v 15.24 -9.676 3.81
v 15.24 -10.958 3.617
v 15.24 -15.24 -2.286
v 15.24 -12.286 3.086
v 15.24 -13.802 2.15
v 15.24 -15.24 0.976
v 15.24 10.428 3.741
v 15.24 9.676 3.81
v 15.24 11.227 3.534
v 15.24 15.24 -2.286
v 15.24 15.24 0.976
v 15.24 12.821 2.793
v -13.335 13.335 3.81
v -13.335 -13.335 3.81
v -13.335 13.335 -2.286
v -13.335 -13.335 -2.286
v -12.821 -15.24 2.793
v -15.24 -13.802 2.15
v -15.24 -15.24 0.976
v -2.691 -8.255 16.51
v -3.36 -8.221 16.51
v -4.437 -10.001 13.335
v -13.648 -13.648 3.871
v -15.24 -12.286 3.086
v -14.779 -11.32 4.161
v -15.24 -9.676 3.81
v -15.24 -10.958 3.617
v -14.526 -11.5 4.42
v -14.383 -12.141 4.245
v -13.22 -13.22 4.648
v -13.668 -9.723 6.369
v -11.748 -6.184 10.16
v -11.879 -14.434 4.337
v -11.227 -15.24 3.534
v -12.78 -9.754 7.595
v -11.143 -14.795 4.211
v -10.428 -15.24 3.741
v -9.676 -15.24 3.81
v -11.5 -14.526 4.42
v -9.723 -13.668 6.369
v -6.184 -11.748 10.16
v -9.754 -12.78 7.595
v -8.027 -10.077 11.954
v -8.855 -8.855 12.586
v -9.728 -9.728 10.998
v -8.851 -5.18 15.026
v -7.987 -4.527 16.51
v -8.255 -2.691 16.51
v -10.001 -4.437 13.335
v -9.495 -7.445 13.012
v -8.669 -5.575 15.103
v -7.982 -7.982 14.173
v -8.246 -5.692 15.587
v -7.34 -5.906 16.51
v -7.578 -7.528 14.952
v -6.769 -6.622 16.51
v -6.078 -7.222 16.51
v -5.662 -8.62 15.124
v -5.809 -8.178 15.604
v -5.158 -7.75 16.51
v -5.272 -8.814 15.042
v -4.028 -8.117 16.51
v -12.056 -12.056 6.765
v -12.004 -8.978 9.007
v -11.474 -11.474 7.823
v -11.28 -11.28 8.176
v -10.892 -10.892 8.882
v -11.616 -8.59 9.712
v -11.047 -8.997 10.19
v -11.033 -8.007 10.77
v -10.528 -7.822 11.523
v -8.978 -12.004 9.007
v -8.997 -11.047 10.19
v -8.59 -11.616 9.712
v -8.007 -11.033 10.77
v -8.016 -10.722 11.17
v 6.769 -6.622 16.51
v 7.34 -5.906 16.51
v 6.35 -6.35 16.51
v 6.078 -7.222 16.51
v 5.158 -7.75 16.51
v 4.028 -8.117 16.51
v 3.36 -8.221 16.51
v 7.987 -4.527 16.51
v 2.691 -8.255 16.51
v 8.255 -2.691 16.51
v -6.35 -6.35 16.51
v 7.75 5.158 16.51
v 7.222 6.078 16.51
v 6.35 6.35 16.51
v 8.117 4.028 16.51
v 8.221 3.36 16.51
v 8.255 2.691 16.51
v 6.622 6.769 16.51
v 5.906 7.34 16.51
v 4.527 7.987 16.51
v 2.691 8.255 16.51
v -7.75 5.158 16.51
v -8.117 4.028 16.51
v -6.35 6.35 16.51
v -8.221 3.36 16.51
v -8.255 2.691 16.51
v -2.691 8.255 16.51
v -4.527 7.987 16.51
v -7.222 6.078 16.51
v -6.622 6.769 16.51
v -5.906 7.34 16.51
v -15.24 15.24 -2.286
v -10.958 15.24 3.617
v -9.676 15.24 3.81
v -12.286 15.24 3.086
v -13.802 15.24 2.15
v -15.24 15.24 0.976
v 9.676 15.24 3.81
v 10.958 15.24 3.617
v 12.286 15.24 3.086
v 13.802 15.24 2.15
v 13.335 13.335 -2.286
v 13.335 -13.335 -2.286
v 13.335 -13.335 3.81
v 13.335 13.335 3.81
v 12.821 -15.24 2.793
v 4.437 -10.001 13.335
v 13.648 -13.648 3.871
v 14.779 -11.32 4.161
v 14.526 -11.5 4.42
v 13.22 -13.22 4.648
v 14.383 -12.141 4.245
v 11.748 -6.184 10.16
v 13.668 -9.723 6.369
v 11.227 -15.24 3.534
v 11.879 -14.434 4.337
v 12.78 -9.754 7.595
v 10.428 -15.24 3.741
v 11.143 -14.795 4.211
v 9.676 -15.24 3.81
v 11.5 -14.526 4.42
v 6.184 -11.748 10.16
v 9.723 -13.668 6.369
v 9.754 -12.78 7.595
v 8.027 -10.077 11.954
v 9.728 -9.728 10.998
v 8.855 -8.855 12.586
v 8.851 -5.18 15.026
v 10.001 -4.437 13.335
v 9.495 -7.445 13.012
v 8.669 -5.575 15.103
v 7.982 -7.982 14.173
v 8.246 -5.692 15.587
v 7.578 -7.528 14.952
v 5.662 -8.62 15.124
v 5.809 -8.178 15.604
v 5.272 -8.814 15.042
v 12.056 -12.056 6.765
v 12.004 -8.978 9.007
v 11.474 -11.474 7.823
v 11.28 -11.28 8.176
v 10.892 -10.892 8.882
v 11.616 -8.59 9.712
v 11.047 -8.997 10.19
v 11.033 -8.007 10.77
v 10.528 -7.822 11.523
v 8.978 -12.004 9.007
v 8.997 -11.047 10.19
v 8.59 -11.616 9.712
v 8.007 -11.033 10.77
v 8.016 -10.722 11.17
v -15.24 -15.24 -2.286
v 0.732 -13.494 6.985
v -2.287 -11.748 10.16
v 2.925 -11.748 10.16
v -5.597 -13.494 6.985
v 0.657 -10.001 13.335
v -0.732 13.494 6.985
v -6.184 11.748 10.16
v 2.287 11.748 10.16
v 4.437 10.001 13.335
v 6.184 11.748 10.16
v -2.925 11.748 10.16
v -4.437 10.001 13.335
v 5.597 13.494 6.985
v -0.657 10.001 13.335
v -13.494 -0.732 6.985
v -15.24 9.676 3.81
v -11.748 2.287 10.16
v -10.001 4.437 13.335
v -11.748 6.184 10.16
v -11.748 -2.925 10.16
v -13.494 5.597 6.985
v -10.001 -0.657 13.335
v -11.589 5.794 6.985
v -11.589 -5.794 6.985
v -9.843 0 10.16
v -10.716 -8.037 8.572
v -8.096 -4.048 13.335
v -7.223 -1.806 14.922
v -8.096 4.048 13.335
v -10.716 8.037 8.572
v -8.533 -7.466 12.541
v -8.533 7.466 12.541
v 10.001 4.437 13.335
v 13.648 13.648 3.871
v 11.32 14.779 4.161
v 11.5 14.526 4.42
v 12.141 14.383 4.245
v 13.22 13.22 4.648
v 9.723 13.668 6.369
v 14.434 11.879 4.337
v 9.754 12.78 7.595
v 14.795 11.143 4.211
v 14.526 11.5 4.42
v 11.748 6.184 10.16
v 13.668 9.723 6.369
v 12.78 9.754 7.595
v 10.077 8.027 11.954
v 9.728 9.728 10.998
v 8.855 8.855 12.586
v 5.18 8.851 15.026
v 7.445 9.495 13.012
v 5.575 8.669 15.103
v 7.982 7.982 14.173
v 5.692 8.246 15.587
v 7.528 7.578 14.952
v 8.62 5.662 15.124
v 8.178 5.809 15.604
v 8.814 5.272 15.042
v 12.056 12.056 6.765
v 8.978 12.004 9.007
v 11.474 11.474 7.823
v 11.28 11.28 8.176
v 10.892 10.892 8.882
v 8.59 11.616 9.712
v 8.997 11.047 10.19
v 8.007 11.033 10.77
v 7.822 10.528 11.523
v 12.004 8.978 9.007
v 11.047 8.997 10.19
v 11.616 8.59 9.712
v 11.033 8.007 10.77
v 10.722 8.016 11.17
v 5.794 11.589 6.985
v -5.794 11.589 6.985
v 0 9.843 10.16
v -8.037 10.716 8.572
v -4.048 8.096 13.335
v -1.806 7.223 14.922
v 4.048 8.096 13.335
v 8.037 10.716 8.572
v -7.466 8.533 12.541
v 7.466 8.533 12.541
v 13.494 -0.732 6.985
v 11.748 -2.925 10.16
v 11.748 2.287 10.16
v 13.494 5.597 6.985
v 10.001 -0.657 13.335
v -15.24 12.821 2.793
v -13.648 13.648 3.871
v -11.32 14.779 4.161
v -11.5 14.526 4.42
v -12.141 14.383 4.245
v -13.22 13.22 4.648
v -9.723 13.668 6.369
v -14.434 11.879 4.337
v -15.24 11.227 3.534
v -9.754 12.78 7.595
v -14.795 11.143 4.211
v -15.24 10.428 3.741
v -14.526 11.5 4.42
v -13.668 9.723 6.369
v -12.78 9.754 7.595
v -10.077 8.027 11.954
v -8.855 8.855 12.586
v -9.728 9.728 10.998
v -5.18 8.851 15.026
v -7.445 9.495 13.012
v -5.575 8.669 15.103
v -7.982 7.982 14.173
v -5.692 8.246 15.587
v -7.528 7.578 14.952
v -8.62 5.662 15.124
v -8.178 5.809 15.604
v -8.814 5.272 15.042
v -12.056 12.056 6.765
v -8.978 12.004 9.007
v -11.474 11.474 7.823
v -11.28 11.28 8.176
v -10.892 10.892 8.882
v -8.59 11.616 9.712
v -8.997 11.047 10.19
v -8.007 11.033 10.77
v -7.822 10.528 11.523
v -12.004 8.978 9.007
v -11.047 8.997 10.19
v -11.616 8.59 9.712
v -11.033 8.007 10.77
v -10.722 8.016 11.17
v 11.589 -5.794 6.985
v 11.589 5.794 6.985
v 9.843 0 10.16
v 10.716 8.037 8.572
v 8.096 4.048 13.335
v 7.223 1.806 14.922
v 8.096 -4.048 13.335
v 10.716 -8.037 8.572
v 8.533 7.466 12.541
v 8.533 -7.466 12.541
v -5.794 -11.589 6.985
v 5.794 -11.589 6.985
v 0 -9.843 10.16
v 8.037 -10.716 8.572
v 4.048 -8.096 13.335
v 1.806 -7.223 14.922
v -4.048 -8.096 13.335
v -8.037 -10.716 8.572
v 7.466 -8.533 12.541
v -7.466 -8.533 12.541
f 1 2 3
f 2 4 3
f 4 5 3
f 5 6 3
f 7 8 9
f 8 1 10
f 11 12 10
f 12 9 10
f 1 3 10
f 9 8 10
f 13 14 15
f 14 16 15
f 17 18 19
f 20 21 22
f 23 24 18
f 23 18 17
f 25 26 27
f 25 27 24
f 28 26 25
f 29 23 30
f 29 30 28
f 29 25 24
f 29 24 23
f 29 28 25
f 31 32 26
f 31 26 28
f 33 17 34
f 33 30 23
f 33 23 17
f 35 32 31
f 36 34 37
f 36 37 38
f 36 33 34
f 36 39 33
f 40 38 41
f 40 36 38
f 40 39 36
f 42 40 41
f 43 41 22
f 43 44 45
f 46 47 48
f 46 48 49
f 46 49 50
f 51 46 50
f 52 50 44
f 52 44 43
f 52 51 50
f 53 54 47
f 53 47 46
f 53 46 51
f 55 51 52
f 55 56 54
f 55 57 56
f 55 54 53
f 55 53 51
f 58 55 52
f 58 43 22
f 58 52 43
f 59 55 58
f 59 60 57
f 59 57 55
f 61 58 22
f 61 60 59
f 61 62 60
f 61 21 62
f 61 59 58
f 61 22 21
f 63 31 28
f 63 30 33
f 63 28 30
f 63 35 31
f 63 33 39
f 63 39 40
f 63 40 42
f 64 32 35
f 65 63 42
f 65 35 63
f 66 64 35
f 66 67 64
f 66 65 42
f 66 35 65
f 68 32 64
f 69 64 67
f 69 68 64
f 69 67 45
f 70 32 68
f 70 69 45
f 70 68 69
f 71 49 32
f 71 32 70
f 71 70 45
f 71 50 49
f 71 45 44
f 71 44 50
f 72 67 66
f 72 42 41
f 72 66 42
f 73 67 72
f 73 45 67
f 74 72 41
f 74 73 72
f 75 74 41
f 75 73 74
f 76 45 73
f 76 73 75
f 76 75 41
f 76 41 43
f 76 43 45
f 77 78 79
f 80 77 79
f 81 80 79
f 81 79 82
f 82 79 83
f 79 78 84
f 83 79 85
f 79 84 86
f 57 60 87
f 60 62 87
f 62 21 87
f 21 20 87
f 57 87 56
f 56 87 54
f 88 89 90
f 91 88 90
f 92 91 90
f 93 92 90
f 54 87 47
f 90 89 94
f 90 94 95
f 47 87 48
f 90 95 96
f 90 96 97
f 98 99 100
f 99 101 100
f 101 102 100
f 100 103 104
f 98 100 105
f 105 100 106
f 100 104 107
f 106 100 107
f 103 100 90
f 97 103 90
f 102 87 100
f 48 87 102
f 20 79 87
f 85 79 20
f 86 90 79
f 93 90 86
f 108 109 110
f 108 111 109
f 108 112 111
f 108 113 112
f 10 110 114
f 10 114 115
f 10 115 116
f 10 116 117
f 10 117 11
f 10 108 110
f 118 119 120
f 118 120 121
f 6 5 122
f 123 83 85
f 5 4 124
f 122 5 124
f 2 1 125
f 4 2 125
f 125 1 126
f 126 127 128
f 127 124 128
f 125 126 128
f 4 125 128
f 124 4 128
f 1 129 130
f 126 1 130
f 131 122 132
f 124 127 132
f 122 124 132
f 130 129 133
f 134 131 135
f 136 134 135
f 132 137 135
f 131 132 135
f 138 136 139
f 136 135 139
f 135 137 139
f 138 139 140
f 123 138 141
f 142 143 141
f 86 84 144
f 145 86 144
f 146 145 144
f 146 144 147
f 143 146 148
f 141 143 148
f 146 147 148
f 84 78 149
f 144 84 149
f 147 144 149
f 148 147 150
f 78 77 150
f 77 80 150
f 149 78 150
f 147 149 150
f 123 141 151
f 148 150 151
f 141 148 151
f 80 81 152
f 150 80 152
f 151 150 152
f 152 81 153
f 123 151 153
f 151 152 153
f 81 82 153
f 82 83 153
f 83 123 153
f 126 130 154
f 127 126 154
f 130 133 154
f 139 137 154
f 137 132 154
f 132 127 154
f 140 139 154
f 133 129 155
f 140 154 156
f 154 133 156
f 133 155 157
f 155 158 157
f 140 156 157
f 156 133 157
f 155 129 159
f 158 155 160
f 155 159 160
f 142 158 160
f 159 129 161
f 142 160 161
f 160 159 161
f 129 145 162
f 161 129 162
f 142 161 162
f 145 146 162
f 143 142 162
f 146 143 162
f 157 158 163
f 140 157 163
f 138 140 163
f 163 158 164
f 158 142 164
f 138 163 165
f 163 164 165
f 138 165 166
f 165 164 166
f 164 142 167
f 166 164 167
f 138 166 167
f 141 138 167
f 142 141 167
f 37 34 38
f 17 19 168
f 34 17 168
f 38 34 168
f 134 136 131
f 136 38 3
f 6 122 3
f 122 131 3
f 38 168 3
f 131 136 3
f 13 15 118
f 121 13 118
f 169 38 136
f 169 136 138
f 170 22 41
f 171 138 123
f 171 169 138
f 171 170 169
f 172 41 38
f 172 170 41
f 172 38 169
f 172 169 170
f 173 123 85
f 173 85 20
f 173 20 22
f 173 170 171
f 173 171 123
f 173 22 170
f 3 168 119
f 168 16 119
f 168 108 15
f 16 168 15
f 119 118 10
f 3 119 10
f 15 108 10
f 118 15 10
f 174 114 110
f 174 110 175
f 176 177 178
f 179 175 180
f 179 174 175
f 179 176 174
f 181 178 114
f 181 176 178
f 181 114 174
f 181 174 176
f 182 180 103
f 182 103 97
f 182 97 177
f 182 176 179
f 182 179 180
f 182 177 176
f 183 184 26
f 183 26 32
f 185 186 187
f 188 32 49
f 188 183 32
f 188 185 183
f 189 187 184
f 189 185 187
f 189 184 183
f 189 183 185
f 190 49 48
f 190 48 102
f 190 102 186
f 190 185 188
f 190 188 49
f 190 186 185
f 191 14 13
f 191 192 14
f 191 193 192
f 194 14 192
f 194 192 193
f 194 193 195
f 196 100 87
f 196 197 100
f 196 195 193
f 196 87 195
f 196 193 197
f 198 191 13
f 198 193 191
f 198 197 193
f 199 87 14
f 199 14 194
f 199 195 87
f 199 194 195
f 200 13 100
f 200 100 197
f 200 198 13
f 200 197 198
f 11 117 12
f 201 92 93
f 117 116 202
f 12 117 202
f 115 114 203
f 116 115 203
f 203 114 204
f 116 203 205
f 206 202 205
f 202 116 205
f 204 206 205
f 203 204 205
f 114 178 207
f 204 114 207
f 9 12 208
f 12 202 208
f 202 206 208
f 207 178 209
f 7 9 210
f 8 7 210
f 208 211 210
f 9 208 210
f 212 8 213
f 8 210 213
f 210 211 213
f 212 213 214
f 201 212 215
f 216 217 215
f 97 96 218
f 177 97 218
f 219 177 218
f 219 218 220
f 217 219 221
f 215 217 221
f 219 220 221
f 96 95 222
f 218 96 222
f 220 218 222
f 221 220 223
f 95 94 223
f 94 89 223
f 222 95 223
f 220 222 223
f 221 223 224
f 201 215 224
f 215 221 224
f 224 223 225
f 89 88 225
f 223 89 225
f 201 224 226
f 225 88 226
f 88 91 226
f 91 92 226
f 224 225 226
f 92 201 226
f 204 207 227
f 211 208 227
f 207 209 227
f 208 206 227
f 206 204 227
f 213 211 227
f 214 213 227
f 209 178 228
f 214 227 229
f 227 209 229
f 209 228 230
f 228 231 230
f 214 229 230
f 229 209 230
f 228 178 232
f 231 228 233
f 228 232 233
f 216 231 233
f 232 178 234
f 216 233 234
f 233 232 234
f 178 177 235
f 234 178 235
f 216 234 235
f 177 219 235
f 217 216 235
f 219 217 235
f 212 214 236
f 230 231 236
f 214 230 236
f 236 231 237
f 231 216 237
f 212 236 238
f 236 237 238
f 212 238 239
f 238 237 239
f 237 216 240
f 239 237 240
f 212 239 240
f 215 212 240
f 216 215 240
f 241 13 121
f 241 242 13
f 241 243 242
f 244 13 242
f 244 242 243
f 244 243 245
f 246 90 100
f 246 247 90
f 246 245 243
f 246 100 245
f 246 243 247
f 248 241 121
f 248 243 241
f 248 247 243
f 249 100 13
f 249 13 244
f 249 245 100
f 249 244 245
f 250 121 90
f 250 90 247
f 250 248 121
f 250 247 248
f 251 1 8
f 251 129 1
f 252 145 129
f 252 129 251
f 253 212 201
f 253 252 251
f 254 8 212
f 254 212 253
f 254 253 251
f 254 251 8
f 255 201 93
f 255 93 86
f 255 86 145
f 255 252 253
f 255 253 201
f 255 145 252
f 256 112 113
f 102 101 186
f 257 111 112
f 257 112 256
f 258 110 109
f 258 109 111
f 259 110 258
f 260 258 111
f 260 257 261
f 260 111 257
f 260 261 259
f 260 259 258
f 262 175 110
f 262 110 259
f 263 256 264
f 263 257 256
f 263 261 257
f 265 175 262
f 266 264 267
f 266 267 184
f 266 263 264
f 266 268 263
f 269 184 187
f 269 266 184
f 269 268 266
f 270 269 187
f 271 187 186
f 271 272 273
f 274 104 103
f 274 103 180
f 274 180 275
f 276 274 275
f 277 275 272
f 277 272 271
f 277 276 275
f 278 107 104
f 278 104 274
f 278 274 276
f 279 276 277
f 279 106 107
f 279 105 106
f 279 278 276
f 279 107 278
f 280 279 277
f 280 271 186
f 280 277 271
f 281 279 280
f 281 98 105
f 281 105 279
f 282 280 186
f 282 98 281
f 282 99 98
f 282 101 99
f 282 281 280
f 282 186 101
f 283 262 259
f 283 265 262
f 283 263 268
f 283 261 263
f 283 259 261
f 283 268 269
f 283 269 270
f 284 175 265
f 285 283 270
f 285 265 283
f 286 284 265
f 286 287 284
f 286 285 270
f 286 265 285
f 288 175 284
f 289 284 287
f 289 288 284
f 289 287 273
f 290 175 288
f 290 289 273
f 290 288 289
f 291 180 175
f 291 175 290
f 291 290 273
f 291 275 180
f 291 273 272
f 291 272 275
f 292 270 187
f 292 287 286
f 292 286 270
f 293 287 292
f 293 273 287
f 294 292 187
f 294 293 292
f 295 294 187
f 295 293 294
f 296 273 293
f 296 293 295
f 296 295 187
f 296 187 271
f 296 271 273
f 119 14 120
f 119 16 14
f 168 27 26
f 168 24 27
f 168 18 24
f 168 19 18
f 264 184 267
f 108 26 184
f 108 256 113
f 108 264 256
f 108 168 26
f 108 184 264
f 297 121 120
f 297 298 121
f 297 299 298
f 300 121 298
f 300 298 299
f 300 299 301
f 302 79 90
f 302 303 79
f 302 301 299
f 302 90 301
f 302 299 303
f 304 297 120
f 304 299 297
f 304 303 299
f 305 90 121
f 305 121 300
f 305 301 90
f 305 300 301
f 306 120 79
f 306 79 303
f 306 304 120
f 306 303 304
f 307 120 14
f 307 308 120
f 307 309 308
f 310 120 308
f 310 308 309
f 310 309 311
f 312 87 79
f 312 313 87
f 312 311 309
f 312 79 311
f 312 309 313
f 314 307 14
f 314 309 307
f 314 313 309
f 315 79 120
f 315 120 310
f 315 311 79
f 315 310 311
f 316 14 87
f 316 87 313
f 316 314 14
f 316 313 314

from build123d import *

# Parameters (mm, degrees)
F0_W     = 30.48
F0_H     = 30.48
F0_W_2   = 26.67
F0_H_2   = 26.67
F1_DEPTH = 2.286
F2_DEPTH = 3.81
F10_R    = 6.35


with BuildPart() as f1:
    # F0 (on Top) → F1 (new body)
    with BuildSketch(Plane.XY):
        Rectangle(F0_W, F0_H)
        Rectangle(F0_W_2, F0_H_2, mode=Mode.SUBTRACT)
    extrude(amount=-F1_DEPTH)

    # F0 (on Top) → F2 (join)
    with BuildSketch(Plane.XY):
        Rectangle(F0_W, F0_H)
        Rectangle(F0_W_2, F0_H_2, mode=Mode.SUBTRACT)
    extrude(amount=F2_DEPTH)

    # F5 (on face) → F6 section 0
    with BuildSketch(Plane.XY.offset(3.81)):
        Polygon((-13.335, 13.335), (-15.24, 15.24), (-15.24, -15.24), (-13.335, -13.335), align=None)
    # F4 (on offset) → F6 section 1
    with BuildSketch(Plane.XY.offset(16.51)):
        Polygon((-6.35, -6.35), (-6.35, 6.35), (-8.255, 8.255), (-8.255, -8.255), align=None)
    loft()

    # F5 (on face) → F7 section 0
    with BuildSketch(Plane.XY.offset(3.81)):
        Polygon((-15.24, -15.24), (15.24, -15.24), (13.335, -13.335), (-13.335, -13.335), align=None)
    # F4 (on offset) → F7 section 1
    with BuildSketch(Plane.XY.offset(16.51)):
        Polygon((8.255, -8.255), (6.35, -6.35), (-6.35, -6.35), (-8.255, -8.255), align=None)
    loft()

    # F5 (on face) → F8 section 0
    with BuildSketch(Plane.XY.offset(3.81)):
        Polygon((15.24, -15.24), (15.24, 15.24), (13.335, 13.335), (13.335, -13.335), align=None)
    # F4 (on offset) → F8 section 1
    with BuildSketch(Plane.XY.offset(16.51)):
        Polygon((8.255, 8.255), (6.35, 6.35), (6.35, -6.35), (8.255, -8.255), align=None)
    loft()

    # F5 (on face) → F9 section 0
    with BuildSketch(Plane.XY.offset(3.81)):
        Polygon((13.335, 13.335), (15.24, 15.24), (-15.24, 15.24), (-13.335, 13.335), align=None)
    # F4 (on offset) → F9 section 1
    with BuildSketch(Plane.XY.offset(16.51)):
        Polygon((-6.35, 6.35), (6.35, 6.35), (8.255, 8.255), (-8.255, 8.255), align=None)
    loft()

    # F10
    f10_edges = [f1.edges().sort_by_distance(p)[0] for p in [
        (-11.7475, -11.7475, 10.16),
        (11.7475, -11.7475, 10.16),
        (11.7475, 11.7475, 10.16),
        (-11.7475, 11.7475, 10.16),
    ]]
    fillet(f10_edges, radius=F10_R)


solid = f1.part
